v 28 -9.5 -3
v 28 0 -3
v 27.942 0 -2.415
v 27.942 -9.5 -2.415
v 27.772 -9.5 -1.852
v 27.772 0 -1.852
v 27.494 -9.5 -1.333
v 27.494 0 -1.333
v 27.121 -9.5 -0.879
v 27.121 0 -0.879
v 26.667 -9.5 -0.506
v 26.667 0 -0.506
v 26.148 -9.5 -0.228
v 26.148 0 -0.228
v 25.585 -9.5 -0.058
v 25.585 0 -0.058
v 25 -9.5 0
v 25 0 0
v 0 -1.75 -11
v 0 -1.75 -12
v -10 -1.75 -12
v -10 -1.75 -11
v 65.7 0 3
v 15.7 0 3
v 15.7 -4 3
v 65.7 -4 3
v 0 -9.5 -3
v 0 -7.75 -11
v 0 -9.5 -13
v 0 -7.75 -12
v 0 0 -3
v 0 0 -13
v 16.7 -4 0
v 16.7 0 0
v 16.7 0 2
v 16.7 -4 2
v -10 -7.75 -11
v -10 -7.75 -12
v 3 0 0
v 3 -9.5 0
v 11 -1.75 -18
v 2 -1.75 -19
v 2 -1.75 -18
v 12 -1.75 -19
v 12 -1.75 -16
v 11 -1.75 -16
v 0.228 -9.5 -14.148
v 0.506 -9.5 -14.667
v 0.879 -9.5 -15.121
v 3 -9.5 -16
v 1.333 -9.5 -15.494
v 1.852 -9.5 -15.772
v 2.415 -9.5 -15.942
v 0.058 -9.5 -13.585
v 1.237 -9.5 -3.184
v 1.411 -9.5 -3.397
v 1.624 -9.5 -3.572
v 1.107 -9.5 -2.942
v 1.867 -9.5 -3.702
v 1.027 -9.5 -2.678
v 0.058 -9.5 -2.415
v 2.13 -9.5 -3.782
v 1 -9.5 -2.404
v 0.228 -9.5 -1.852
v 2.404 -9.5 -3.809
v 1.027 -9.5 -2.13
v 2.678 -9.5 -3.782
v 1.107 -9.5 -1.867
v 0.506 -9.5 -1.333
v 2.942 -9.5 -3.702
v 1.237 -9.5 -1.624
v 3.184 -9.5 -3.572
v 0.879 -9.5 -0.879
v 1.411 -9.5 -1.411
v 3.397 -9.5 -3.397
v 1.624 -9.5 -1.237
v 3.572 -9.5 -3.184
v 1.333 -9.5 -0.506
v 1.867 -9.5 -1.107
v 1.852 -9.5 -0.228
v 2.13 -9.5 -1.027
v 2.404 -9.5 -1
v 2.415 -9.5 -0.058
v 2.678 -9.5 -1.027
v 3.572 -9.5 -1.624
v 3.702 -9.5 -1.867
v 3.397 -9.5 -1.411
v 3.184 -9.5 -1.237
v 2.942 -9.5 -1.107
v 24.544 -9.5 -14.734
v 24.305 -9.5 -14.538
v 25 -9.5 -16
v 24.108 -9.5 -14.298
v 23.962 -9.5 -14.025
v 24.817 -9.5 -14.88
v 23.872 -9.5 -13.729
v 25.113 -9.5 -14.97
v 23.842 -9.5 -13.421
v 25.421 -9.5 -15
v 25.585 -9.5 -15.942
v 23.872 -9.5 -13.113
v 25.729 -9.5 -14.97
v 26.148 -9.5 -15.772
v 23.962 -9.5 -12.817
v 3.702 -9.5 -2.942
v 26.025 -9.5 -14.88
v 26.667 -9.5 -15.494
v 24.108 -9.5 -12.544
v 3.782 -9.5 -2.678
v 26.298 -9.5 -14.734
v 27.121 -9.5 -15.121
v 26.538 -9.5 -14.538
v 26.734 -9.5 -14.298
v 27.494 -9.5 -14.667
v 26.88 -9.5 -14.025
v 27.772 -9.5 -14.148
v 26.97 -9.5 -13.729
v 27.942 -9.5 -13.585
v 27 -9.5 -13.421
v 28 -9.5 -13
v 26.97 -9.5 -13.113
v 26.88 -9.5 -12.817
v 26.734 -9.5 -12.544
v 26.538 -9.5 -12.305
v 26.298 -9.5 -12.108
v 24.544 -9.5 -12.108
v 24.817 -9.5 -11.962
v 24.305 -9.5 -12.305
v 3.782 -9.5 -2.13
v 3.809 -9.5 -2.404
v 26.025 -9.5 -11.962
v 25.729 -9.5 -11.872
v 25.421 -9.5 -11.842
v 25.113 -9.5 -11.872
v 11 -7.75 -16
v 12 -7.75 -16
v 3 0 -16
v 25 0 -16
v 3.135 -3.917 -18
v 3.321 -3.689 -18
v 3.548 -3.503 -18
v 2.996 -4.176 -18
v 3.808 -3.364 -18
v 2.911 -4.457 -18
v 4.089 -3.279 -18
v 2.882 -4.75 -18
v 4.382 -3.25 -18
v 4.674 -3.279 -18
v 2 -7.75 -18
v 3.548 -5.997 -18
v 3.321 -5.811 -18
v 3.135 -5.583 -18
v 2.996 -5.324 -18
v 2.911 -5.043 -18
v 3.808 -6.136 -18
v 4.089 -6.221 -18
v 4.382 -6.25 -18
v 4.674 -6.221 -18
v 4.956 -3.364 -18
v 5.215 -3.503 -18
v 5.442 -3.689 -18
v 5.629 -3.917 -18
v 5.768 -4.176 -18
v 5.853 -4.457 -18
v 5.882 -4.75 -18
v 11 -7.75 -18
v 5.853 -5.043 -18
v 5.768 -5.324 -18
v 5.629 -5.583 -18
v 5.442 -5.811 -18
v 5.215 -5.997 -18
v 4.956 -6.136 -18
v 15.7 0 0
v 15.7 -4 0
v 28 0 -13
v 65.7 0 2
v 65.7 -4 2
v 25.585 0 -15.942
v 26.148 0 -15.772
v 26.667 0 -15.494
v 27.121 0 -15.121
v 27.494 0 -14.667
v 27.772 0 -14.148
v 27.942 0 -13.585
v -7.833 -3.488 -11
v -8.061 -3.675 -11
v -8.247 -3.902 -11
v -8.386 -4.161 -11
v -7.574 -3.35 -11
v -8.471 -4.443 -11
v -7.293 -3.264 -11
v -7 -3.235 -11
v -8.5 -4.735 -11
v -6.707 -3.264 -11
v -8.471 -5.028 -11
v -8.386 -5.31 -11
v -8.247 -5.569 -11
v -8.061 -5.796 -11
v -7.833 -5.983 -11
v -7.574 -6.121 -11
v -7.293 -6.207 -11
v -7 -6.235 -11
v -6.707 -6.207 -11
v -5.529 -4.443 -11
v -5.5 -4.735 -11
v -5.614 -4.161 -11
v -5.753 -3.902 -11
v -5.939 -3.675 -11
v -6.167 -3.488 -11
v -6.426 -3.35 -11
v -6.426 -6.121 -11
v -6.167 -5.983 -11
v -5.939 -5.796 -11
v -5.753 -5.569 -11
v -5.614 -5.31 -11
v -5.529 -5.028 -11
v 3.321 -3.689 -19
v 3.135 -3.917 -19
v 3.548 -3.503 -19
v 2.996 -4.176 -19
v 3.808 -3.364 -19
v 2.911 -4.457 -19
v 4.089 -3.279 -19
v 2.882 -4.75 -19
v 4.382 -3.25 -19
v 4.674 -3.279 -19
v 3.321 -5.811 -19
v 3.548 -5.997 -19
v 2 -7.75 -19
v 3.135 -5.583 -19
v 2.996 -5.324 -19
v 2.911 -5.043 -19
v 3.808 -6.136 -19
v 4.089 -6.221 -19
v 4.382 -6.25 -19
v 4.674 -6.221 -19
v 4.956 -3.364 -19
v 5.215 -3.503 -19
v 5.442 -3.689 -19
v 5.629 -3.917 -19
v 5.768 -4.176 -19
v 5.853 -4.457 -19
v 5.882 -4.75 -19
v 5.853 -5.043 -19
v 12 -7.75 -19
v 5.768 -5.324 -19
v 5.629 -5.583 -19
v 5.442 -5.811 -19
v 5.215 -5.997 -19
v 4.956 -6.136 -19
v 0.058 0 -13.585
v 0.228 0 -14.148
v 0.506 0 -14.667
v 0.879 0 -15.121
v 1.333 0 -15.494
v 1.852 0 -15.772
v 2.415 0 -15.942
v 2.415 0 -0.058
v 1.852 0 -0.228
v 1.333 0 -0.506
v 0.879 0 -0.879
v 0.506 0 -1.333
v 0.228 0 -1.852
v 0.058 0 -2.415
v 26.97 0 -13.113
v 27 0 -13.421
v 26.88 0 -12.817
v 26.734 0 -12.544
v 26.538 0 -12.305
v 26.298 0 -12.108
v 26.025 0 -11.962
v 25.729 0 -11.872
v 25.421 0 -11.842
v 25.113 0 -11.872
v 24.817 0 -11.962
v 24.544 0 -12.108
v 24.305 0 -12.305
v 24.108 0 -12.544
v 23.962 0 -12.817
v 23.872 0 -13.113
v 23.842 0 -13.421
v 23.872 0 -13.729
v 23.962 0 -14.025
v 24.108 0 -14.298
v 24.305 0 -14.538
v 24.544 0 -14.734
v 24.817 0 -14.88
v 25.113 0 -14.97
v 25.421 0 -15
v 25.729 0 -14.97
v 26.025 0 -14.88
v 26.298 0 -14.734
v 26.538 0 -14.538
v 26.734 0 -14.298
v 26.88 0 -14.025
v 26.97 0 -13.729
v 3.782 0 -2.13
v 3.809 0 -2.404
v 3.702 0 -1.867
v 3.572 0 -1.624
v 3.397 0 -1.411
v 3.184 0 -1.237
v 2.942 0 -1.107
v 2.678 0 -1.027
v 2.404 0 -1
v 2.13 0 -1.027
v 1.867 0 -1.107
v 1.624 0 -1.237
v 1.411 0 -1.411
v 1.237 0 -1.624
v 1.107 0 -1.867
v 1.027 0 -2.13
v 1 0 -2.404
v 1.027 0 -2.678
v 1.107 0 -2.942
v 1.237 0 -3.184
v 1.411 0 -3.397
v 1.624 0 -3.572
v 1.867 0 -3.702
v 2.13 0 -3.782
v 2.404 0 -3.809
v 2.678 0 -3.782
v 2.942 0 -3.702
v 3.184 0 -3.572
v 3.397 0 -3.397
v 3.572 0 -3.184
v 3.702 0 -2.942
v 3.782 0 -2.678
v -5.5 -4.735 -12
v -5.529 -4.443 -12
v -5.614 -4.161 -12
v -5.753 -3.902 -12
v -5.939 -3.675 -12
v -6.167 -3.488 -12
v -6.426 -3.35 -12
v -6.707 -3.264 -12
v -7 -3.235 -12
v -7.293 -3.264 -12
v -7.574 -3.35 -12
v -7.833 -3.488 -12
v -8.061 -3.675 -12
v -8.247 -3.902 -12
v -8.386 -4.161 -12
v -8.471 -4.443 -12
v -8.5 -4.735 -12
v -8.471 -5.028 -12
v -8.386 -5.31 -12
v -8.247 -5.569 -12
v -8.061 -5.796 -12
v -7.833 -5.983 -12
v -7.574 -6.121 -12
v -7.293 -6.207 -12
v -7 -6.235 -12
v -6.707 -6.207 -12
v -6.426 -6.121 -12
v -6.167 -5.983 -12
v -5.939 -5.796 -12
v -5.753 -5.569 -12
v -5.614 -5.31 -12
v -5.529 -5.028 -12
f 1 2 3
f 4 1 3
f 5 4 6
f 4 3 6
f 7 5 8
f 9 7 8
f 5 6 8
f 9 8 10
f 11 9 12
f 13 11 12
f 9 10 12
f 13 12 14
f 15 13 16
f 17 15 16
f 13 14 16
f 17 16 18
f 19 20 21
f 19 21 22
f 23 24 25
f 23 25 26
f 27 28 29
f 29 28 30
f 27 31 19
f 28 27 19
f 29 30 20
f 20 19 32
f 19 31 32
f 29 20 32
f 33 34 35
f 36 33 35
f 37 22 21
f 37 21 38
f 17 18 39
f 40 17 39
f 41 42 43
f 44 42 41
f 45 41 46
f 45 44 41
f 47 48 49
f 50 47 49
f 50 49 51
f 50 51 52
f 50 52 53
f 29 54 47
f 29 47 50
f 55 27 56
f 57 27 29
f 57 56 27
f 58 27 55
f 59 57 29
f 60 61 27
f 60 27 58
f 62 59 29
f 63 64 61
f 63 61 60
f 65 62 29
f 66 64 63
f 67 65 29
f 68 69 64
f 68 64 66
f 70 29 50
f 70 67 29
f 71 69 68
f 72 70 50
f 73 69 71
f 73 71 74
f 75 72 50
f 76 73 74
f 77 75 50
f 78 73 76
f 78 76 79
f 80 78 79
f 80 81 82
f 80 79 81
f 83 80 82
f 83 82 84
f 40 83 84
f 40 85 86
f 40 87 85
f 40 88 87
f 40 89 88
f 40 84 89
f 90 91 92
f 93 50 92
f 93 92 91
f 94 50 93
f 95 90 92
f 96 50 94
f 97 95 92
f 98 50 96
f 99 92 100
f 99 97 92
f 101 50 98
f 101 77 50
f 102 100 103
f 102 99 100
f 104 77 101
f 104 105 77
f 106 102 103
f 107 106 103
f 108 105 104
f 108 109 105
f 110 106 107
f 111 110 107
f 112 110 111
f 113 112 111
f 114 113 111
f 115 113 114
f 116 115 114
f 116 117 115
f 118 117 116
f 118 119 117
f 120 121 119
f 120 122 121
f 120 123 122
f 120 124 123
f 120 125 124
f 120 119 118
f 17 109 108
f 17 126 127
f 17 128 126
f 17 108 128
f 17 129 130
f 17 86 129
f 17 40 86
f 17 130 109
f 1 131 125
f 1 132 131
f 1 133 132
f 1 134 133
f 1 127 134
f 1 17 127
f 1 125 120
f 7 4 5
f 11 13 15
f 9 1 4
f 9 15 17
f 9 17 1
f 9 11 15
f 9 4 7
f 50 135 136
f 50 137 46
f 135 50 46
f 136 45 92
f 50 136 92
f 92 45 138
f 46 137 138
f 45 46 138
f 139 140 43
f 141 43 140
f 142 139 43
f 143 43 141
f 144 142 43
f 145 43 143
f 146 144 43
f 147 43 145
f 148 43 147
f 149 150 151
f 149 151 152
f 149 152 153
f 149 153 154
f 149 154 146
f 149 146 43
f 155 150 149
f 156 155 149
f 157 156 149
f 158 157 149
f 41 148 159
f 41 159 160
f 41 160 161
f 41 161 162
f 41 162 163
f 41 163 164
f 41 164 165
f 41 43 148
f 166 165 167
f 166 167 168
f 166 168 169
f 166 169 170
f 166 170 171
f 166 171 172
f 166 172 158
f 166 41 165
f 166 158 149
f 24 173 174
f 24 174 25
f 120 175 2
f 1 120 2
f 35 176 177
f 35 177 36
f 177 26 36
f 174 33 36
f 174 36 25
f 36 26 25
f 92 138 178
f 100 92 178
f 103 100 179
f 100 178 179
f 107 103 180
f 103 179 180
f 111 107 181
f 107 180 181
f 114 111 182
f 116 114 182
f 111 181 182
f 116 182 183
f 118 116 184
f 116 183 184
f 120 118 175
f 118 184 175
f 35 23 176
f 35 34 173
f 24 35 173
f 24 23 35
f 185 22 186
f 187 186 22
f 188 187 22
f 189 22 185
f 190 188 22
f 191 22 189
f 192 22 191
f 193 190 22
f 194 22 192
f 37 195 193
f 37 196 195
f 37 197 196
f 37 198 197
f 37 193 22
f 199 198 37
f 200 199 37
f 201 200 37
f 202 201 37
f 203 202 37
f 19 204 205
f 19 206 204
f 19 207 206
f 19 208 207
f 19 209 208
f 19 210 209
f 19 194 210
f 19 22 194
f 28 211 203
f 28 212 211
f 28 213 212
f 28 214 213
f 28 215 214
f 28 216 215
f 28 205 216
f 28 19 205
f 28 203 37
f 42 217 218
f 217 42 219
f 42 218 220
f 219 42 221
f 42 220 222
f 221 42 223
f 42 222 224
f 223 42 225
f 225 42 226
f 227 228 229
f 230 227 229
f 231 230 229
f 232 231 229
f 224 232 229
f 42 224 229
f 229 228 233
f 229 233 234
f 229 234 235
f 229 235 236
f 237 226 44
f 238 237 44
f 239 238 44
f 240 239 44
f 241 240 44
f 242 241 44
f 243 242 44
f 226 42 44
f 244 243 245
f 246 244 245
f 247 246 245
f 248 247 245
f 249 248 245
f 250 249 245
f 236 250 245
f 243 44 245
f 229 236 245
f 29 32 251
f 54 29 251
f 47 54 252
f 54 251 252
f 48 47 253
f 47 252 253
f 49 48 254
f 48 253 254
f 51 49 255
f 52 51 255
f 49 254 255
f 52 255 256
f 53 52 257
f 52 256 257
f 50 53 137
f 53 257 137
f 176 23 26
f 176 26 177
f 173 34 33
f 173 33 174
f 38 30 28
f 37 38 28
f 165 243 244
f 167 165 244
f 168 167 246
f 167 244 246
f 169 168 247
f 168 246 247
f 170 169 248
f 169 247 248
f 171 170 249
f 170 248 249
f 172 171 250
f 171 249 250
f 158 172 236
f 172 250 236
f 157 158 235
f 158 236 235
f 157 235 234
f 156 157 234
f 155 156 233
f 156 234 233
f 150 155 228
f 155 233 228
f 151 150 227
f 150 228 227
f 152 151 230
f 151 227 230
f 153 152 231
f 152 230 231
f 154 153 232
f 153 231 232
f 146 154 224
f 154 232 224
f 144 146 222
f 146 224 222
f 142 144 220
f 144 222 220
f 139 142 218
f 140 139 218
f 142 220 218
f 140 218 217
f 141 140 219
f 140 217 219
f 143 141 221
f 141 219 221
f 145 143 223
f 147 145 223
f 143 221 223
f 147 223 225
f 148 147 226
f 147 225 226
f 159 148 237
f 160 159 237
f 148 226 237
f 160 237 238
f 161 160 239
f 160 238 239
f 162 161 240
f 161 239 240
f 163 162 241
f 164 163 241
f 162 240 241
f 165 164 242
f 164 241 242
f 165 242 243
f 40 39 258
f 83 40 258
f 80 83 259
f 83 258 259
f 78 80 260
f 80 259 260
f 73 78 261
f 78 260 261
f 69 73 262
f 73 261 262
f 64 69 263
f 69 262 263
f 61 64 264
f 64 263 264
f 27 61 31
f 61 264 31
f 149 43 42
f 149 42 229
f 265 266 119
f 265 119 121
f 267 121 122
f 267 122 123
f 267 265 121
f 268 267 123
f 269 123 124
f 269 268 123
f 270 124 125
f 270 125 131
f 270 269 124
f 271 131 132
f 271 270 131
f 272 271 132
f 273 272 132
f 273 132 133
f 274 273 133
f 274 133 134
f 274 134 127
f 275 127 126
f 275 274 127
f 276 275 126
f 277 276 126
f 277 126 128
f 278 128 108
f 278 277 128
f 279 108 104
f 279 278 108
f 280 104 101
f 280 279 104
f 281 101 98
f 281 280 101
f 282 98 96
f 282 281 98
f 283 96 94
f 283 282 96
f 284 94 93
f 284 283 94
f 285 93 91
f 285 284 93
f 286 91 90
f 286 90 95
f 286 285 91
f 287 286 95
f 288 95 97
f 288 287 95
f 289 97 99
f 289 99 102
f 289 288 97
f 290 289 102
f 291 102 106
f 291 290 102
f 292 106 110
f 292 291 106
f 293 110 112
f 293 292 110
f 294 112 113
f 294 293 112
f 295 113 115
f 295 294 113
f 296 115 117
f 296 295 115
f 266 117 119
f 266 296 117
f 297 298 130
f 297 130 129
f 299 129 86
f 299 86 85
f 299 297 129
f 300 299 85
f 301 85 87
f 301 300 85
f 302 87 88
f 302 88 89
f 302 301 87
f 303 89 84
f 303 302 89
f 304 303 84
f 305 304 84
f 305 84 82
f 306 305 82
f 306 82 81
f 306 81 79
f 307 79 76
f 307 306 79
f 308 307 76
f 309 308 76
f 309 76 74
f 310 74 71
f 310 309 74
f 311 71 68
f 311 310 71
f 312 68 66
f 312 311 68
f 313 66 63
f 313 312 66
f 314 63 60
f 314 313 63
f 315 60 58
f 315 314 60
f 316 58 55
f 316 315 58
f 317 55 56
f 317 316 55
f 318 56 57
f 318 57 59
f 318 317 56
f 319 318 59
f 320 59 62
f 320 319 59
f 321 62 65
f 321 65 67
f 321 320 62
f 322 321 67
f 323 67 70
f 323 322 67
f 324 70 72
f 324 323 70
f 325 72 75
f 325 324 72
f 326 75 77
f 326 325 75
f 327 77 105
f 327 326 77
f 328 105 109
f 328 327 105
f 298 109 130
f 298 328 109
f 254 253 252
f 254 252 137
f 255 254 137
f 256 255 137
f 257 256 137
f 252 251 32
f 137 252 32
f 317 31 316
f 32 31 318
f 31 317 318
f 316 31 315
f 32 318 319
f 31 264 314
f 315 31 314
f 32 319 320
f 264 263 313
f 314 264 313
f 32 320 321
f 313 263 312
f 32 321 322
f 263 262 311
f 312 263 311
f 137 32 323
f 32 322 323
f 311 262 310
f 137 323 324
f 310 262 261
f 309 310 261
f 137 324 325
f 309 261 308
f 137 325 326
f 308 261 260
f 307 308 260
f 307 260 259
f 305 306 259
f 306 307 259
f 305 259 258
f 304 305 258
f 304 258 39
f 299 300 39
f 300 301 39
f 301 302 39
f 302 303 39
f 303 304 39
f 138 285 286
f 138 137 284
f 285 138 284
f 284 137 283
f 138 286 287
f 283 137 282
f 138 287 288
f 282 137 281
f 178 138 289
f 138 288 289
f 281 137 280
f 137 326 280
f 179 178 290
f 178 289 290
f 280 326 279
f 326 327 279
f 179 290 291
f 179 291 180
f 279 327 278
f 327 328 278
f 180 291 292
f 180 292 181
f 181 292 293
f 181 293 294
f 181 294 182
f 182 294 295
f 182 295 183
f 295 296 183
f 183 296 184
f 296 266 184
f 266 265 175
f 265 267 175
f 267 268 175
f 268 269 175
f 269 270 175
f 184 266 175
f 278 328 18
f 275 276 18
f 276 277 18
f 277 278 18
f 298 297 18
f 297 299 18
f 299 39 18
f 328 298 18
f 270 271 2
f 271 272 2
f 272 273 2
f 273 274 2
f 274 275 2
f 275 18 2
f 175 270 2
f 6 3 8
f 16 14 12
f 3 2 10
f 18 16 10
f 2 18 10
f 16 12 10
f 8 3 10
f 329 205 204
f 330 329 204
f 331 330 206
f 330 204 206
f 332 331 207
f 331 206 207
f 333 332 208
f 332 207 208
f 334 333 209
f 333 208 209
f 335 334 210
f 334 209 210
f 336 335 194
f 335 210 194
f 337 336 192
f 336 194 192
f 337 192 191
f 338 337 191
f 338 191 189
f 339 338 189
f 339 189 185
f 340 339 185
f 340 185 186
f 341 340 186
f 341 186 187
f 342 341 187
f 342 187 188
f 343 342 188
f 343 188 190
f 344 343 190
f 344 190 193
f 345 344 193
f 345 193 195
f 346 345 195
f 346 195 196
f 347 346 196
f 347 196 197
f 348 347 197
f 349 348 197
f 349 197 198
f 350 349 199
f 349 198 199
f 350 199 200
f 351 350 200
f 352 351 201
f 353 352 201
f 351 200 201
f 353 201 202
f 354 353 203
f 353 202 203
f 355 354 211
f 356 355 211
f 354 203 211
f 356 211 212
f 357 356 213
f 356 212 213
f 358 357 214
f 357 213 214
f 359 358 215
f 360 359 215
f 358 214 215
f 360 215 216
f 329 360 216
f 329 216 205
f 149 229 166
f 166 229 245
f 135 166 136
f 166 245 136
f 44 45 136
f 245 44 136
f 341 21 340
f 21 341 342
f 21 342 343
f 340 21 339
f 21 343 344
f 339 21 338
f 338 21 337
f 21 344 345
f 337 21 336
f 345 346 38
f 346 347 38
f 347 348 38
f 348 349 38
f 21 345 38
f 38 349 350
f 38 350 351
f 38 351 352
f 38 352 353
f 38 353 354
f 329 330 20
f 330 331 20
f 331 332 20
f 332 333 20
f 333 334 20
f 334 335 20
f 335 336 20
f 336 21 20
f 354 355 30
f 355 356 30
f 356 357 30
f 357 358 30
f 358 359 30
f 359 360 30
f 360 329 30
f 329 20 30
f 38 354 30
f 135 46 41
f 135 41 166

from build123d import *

# Parameters (mm, degrees)
F0_R      = 1.578967
F0_R_2    = 1.40429
F1_DEPTH  = 9.5
F2_W      = 6
F2_H      = 1
F3_DEPTH  = 10
F4_R      = 1.5
F5_DEPTH  = 25
F6_W      = 1
F6_H      = 6
F7_DEPTH  = 3
F8_W      = 6
F8_H      = 1
F9_DEPTH  = 9
F10_R     = 1.5
F11_DEPTH = 1
F12_W     = 1
F12_H     = 2
F13_DEPTH = 4


with BuildPart() as f1:
    # F0 (on Front) → F1 (new body)
    with BuildSketch(Plane.XZ):
        with BuildLine():
            Line((25, 0), (3, 0))
            ThreePointArc((3, 0), (0.87868, -0.87868), (0, -3))
            Line((0, -3), (0, -13))
            ThreePointArc((0, -13), (0.87868, -15.12132), (3, -16))
            Line((3, -16), (25, -16))
            ThreePointArc((25, -16), (27.12132, -15.12132), (28, -13))
            Line((28, -13), (28, -3))
            ThreePointArc((28, -3), (27.12132, -0.87868), (25, 0))
        make_face()
        with Locations((25.421033, -13.421033)):
            Circle(F0_R, mode=Mode.SUBTRACT)
        with Locations((2.40429, -2.40429)):
            Circle(F0_R_2, mode=Mode.SUBTRACT)
    extrude(amount=F1_DEPTH)

    # F2 (on face) → F3 (join)
    with BuildSketch(Plane(origin=(0, 0, 0), x_dir=(0, -1, 0), z_dir=(-1, 0, 0))):
        with Locations((4.75, -11.5)):
            Rectangle(F2_W, F2_H)
    extrude(amount=F3_DEPTH)

    # F4 (on face) → F5 (cut)
    with BuildSketch(Plane.XY.offset(-11)):
        with Locations((-7, -4.735485)):
            Circle(F4_R)
    extrude(amount=-F5_DEPTH, mode=Mode.SUBTRACT)

    # F6 (on face) → F7 (join)
    with BuildSketch(Plane(origin=(0, 0, -16), x_dir=(1, 0, 0), z_dir=(0, 0, -1))):
        with Locations((11.5, 4.75)):
            Rectangle(F6_W, F6_H)
    extrude(amount=F7_DEPTH)

    # F8 (on face) → F9 (join)
    with BuildSketch(Plane(origin=(11, 0, 0), x_dir=(0, -1, 0), z_dir=(-1, 0, 0))):
        with Locations((4.75, -18.5)):
            Rectangle(F8_W, F8_H)
    extrude(amount=F9_DEPTH)

    # F10 (on face) → F11 (cut)
    with BuildSketch(Plane(origin=(0, 0, -19), x_dir=(1, 0, 0), z_dir=(0, 0, -1))):
        with Locations((4.381761, 4.75)):
            Circle(F10_R)
    extrude(amount=-F11_DEPTH, mode=Mode.SUBTRACT)


with BuildPart() as f13:
    # F12 (on face) → F13 (new body)
    with BuildSketch(Plane(origin=(0, 0, 0), x_dir=(-1, 0, 0), z_dir=(0, 1, 0))):
        Polygon((-16.700253, 2), (-15.700253, 2), (-15.700253, 3), (-65.700253, 3), (-65.700253, 2), align=None)
        with Locations((-16.200253, 1)):
            Rectangle(F12_W, F12_H)
    extrude(amount=-F13_DEPTH)


solid = Compound([f1.part, f13.part])
